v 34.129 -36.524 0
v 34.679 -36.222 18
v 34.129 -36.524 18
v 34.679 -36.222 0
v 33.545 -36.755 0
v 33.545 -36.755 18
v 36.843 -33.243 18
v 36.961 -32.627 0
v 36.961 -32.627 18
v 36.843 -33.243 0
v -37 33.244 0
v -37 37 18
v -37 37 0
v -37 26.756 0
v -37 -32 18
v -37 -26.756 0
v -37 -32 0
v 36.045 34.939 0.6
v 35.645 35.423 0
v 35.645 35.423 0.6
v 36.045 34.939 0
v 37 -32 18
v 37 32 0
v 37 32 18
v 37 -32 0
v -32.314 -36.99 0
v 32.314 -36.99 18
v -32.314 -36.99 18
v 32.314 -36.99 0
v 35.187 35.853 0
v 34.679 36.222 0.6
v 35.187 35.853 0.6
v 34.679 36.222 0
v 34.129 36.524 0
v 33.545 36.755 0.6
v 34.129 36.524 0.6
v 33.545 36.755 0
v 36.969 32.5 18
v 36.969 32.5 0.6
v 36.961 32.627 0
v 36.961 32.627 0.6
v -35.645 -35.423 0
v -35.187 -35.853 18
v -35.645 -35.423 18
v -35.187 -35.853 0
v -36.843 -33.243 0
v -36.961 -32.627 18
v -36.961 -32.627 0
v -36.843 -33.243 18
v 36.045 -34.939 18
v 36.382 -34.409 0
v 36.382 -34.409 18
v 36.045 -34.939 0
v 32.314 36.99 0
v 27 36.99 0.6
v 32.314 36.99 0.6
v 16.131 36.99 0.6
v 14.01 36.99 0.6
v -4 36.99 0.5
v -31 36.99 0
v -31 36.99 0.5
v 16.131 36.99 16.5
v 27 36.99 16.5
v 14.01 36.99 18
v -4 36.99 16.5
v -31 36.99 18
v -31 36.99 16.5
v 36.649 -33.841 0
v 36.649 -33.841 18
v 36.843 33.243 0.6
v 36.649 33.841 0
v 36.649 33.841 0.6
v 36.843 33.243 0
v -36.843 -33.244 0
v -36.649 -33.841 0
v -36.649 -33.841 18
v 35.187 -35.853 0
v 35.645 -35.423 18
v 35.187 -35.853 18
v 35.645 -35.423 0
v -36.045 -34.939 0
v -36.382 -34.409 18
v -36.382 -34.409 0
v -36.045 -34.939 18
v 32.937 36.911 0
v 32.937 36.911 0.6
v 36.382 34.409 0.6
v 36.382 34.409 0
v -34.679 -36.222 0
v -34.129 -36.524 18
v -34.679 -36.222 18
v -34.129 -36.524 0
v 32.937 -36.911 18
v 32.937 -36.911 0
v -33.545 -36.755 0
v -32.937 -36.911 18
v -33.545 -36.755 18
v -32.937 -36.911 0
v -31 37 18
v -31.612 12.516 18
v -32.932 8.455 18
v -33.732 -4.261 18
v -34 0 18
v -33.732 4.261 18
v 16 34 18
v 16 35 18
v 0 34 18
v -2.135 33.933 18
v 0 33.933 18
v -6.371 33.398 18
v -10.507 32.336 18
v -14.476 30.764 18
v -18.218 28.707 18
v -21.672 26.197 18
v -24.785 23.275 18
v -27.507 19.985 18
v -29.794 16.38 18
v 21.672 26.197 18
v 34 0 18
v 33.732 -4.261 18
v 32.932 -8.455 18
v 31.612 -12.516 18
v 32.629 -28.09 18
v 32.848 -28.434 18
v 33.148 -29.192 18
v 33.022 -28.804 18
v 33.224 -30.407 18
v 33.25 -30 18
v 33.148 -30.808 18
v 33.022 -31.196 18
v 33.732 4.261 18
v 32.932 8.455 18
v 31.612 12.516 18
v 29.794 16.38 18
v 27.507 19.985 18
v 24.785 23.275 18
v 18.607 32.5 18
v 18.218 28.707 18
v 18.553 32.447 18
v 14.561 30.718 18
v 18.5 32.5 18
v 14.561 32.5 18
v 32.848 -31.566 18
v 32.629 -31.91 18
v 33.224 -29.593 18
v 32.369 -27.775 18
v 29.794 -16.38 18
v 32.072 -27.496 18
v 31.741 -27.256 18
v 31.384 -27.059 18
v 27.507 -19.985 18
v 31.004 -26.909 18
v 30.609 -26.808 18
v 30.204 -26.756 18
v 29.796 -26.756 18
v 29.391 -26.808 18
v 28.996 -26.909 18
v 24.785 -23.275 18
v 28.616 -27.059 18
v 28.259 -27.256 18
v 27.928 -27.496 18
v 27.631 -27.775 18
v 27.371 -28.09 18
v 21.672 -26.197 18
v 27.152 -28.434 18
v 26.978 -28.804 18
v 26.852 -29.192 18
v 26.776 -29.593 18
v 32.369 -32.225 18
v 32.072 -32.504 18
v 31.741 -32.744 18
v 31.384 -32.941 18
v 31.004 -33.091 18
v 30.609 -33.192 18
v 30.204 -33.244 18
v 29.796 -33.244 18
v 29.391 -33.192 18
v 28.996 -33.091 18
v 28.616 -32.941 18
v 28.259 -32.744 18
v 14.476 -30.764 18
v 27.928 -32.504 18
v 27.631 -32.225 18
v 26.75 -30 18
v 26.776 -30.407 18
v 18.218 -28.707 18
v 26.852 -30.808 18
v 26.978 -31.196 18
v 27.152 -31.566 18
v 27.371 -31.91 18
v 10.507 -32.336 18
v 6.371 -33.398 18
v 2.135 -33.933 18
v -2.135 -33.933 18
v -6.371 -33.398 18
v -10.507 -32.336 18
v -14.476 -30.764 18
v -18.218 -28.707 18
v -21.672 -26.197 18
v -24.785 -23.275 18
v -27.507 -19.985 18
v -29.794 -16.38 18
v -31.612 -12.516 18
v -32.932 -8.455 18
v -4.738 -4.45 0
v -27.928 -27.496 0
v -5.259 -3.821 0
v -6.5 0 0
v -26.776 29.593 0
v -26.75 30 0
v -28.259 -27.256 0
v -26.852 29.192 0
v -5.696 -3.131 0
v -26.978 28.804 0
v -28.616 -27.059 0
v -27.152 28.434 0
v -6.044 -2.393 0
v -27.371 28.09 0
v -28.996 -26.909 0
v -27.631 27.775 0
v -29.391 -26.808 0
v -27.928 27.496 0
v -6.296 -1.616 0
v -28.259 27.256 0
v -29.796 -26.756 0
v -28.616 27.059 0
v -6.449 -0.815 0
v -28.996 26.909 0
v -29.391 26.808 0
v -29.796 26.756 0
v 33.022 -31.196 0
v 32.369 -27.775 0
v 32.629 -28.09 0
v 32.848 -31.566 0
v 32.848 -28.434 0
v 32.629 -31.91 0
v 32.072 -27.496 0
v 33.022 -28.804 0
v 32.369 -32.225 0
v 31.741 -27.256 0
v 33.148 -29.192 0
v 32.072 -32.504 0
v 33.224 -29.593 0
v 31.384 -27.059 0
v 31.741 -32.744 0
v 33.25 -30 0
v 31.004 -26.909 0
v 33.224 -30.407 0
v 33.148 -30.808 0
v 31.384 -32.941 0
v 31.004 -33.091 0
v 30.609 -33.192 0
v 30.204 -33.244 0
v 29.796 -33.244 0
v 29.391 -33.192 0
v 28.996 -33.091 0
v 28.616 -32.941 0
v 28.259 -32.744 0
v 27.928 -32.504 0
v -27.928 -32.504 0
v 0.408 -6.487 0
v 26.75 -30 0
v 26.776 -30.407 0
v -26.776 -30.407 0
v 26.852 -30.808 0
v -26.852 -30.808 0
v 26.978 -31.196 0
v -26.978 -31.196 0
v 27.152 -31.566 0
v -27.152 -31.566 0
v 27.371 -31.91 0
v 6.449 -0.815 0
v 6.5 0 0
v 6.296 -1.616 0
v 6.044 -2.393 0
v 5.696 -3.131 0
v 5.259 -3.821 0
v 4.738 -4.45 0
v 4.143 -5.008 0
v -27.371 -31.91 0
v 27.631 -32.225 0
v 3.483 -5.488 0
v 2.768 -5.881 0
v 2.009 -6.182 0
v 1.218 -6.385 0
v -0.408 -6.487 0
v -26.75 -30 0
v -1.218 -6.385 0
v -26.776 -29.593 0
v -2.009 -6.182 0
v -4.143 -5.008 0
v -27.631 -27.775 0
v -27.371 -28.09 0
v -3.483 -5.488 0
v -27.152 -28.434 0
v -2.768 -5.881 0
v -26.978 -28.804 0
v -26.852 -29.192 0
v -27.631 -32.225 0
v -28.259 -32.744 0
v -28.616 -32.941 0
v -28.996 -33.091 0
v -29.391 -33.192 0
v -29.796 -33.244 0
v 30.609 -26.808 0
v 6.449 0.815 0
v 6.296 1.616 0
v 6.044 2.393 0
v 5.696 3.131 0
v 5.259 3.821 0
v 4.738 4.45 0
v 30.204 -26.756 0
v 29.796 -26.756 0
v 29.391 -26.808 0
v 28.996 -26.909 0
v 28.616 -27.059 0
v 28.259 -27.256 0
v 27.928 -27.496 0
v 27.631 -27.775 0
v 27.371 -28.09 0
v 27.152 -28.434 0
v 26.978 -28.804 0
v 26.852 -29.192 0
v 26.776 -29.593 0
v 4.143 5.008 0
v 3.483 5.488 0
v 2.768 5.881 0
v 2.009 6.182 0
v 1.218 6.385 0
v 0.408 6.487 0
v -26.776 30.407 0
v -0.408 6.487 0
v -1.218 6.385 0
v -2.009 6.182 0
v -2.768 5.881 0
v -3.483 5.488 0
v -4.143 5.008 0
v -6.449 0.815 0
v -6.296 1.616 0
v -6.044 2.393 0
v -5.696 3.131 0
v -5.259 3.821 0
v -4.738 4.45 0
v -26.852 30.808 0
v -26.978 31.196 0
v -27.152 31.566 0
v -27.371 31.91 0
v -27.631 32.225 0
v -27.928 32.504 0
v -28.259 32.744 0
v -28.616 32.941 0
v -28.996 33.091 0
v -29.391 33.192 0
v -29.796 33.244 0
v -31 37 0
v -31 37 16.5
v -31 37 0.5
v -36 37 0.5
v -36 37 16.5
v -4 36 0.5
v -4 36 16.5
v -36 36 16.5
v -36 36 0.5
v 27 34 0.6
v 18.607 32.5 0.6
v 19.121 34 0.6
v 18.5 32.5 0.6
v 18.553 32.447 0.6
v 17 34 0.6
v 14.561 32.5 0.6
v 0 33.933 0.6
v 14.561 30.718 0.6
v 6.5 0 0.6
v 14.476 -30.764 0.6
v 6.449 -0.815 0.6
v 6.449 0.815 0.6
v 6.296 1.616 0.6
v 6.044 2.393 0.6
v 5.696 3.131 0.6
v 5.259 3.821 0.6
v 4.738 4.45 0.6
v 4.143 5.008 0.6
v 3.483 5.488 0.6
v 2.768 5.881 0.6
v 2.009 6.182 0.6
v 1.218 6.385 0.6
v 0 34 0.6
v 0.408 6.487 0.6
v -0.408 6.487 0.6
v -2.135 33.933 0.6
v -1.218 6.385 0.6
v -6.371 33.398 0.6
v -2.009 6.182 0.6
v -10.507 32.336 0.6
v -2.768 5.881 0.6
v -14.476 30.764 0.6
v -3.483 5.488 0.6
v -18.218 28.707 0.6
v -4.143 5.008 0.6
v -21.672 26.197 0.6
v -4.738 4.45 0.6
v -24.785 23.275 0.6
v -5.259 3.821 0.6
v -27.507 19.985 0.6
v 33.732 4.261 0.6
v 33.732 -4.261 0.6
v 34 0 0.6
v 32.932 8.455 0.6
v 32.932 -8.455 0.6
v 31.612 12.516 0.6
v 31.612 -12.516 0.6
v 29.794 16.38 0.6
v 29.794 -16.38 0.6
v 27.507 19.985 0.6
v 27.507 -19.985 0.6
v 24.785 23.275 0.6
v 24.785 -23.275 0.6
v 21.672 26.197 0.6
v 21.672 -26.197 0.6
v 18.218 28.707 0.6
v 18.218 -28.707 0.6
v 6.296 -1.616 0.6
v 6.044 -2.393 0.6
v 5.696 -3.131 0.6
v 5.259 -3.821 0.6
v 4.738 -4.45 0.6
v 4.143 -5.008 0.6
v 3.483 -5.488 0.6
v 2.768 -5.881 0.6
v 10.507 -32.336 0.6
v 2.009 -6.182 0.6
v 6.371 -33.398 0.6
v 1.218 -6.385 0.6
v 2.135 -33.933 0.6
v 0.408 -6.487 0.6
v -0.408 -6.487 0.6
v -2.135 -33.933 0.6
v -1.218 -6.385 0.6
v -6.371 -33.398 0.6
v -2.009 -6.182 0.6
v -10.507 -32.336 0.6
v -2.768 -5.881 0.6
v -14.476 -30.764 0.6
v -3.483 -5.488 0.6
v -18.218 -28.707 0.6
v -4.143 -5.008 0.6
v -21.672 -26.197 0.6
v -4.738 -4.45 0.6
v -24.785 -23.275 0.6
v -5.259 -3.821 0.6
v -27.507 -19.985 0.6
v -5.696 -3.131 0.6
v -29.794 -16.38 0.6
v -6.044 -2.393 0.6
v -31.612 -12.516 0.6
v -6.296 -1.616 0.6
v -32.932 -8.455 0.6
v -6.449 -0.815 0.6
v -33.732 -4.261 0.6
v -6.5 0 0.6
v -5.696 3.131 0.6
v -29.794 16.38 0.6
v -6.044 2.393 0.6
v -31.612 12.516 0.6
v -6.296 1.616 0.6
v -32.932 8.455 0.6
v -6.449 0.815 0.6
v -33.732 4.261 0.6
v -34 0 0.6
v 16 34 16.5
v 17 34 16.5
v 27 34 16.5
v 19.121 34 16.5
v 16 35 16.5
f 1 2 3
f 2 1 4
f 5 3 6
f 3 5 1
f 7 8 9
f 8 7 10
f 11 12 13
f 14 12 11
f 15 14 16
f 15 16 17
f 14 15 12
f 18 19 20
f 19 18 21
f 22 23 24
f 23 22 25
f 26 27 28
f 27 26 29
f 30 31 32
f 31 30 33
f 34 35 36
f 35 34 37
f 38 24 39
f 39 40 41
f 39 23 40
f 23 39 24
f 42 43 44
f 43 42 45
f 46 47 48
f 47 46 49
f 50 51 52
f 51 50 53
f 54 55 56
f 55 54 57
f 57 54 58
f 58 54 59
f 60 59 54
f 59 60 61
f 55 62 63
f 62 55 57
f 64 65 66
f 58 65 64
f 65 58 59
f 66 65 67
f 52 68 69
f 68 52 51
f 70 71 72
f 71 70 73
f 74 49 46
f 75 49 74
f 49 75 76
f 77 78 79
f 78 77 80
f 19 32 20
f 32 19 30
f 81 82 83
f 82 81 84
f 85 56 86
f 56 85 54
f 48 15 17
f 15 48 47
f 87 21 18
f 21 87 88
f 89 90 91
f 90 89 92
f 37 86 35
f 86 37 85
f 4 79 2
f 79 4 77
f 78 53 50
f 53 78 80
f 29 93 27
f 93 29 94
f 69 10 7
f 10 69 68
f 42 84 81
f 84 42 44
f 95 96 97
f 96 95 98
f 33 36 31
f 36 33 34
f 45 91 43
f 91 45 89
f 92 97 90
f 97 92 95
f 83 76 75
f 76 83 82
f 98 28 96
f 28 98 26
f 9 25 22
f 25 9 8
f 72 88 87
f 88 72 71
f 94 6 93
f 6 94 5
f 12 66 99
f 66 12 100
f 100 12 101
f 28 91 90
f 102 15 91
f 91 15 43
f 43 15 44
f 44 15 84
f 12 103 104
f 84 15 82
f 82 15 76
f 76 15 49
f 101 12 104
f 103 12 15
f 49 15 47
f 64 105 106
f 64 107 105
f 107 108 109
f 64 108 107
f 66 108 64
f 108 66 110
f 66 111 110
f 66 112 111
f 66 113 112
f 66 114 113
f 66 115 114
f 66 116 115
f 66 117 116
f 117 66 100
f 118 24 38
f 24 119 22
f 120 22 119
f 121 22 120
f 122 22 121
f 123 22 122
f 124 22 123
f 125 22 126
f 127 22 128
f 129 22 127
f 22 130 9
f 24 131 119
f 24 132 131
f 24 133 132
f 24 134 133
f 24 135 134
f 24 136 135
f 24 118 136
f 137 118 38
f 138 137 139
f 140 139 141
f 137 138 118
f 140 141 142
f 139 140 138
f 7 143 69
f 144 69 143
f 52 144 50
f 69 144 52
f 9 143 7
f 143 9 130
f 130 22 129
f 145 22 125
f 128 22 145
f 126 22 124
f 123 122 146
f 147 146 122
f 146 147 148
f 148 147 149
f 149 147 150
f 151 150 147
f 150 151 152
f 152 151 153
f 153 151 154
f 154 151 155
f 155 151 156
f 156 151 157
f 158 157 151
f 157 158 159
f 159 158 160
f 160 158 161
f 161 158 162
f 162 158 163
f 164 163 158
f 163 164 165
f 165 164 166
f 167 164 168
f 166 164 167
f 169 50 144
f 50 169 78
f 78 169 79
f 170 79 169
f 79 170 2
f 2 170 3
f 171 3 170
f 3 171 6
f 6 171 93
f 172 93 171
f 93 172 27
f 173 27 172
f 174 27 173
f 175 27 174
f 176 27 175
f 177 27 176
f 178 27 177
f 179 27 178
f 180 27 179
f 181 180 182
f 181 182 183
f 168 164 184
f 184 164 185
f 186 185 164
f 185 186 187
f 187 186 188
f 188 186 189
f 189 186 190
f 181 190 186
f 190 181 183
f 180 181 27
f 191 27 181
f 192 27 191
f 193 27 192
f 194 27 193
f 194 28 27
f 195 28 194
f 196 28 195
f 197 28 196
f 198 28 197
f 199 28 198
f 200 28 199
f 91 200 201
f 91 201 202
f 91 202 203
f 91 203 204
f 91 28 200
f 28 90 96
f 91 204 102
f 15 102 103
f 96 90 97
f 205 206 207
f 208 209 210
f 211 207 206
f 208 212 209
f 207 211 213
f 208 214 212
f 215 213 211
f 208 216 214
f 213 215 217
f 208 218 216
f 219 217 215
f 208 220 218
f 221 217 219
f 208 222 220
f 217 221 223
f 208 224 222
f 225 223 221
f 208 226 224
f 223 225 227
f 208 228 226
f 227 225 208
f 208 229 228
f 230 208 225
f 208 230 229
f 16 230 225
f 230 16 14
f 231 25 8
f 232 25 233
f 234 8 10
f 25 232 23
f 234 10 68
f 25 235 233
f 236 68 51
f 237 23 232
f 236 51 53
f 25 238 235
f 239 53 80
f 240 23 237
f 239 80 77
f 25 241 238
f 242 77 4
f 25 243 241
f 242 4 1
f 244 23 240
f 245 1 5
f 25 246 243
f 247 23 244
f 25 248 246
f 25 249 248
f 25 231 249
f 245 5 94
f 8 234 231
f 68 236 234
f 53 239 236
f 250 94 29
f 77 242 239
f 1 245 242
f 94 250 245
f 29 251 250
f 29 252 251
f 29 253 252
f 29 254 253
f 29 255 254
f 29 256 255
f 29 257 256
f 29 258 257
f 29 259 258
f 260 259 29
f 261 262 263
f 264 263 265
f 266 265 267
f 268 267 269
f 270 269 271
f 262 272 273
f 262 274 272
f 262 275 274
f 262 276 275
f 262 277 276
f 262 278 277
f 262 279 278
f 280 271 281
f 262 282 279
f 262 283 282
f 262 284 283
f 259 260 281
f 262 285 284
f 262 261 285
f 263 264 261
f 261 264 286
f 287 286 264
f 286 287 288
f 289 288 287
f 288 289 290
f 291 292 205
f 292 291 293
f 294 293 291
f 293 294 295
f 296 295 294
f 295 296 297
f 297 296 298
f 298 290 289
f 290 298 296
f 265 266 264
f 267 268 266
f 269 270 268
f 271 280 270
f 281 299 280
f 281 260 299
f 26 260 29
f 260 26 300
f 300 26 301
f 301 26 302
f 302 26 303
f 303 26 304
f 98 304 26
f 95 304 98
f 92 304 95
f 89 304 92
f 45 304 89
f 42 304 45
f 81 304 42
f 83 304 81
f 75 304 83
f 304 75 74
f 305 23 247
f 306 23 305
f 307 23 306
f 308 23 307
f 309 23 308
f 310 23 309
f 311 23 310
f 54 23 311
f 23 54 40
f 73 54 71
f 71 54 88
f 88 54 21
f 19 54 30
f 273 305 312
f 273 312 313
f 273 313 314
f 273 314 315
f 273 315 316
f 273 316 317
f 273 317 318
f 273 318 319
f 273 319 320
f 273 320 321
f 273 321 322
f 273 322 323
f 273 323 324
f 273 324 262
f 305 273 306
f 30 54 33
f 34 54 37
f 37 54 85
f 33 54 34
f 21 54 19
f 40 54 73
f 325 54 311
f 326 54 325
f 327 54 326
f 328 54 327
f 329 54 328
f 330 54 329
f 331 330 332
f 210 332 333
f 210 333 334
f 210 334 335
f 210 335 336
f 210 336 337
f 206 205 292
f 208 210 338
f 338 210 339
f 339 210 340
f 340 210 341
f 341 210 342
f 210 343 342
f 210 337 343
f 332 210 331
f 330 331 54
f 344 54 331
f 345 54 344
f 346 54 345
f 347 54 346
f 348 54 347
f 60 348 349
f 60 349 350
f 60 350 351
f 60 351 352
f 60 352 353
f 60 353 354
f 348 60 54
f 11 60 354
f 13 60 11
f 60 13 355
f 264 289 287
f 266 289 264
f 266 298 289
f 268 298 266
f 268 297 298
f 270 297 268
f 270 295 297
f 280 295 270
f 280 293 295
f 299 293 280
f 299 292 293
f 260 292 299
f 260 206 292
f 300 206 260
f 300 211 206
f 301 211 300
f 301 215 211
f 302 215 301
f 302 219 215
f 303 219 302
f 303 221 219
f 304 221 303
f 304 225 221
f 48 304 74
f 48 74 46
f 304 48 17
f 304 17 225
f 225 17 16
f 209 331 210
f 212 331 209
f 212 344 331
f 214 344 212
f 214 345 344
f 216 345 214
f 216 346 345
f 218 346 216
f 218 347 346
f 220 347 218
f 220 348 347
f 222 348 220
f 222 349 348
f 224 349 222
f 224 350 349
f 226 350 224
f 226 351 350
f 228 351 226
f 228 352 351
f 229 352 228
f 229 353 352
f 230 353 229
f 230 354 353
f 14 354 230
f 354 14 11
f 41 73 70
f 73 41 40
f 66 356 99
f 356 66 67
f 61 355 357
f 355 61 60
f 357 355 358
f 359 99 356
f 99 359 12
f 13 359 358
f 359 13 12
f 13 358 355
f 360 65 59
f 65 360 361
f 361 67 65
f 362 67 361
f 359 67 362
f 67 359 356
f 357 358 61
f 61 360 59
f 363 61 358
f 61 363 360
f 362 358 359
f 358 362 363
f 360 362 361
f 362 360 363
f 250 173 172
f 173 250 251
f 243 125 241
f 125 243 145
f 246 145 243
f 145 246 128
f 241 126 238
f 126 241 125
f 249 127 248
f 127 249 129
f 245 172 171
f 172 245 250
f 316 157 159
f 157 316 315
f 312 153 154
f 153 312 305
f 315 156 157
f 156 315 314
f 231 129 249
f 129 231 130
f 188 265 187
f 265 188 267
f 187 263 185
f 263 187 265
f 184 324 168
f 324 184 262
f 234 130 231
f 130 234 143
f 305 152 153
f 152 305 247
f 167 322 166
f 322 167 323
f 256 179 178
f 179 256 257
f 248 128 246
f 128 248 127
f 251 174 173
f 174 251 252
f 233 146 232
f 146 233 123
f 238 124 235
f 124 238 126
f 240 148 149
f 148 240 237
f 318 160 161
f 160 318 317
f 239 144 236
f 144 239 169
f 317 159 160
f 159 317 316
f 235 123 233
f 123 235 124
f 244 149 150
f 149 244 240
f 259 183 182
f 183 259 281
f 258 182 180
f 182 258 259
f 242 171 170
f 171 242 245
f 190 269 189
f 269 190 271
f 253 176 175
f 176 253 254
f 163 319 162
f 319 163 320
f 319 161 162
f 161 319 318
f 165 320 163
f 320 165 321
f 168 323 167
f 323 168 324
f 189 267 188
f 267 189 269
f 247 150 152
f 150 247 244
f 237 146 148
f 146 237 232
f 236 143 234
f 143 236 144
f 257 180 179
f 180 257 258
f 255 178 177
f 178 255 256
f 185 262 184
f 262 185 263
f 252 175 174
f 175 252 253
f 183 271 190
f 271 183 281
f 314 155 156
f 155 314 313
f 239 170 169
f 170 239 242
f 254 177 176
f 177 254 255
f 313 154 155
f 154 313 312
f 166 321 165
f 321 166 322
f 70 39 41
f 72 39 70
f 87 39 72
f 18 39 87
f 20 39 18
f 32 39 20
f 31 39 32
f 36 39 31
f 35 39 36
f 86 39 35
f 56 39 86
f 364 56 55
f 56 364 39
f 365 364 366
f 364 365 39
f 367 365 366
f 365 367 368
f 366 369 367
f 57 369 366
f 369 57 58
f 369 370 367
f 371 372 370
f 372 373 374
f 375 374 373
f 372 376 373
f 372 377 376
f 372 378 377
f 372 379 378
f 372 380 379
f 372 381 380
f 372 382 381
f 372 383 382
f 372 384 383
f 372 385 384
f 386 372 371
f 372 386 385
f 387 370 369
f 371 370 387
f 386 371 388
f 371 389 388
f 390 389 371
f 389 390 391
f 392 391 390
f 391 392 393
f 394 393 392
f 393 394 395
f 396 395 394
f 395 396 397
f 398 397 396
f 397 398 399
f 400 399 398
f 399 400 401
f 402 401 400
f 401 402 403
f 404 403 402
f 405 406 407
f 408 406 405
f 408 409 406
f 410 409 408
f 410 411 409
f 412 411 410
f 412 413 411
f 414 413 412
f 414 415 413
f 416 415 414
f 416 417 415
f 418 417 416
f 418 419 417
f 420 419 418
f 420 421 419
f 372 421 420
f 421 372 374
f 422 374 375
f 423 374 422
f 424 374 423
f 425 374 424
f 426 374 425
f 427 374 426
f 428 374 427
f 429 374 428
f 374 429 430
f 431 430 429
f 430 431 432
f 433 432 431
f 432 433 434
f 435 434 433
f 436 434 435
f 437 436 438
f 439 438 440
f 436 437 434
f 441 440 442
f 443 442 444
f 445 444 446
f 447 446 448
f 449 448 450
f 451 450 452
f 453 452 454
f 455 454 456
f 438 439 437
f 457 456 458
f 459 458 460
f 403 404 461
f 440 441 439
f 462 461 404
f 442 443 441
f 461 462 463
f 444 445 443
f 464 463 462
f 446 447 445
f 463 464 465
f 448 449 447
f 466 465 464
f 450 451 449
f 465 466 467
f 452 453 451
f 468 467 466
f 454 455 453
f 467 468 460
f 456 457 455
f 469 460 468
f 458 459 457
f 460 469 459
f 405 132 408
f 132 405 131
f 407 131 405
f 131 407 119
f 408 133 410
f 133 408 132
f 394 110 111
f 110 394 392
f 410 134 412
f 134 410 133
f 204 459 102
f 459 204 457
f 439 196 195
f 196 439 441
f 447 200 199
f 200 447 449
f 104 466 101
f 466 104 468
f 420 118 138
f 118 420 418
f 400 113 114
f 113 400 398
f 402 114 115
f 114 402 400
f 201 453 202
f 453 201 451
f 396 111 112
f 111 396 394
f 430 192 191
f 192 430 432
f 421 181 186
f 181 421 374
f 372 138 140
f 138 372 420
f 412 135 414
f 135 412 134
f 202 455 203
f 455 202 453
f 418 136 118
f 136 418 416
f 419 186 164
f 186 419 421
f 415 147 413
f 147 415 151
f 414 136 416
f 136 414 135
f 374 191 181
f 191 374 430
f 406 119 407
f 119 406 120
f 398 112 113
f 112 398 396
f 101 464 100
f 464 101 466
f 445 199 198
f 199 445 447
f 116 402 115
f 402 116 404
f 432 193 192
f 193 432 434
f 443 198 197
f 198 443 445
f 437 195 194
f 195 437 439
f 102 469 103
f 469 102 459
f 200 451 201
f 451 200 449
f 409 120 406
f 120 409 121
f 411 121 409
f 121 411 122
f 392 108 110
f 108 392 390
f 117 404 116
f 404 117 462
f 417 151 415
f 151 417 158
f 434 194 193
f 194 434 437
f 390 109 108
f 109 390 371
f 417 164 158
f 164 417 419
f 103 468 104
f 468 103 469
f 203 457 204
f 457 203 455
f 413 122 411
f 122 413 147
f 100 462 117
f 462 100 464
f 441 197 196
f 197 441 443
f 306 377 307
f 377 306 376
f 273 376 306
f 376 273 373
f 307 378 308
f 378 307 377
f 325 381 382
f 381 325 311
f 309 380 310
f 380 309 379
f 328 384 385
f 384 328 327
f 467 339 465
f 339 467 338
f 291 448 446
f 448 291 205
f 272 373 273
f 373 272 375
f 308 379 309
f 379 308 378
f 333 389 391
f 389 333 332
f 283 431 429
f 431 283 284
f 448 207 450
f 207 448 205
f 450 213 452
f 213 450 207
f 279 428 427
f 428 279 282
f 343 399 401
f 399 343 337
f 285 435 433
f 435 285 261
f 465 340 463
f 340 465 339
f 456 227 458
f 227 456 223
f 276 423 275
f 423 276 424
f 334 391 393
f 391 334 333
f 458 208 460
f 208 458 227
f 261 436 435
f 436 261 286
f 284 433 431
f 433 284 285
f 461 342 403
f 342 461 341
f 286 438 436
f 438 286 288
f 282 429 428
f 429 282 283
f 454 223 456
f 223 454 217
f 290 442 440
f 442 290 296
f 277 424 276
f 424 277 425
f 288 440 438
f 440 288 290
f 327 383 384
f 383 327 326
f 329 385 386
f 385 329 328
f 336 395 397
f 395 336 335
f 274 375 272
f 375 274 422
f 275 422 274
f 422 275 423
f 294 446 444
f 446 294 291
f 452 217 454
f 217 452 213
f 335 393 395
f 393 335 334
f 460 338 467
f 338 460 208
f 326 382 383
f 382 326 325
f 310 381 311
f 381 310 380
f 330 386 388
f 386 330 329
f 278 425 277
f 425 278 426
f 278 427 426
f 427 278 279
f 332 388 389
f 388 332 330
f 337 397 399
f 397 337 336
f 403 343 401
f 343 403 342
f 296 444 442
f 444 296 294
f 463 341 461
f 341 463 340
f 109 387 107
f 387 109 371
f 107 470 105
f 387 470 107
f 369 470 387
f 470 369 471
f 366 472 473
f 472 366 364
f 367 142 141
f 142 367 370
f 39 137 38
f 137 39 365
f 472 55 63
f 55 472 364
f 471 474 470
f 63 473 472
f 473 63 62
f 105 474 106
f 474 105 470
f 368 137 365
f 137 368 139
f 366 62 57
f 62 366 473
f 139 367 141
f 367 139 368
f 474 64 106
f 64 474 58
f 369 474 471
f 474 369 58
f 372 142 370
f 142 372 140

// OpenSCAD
$fn = 50;


difference() {
	union() {
		hull() {
			translate(v = [-32.0000000000, 32.0000000000, 0]) {
				cylinder(h = 18, r = 5);
			}
			translate(v = [32.0000000000, 32.0000000000, 0]) {
				cylinder(h = 18, r = 5);
			}
			translate(v = [-32.0000000000, -32.0000000000, 0]) {
				cylinder(h = 18, r = 5);
			}
			translate(v = [32.0000000000, -32.0000000000, 0]) {
				cylinder(h = 18, r = 5);
			}
		}
		translate(v = [-37.0000000000, 31.0000000000, 0]) {
			cube(size = [6, 6, 18]);
		}
	}
	union() {
		translate(v = [-37.5000000000, -30.0000000000, -250.0000000000]) {
			rotate(a = [0, 0, 0]) {
				difference() {
					union() {
						hull() {
							translate(v = [7.5000000000, 0, 0]) {
								cylinder(h = 250, r = 3.2500000000, r1 = 3.2500000000, r2 = 3.2500000000);
							}
							translate(v = [-7.5000000000, 0, 0]) {
								cylinder(h = 250, r = 3.2500000000, r1 = 3.2500000000, r2 = 3.2500000000);
							}
						}
					}
					union();
				}
			}
		}
		translate(v = [-37.5000000000, 30.0000000000, -250.0000000000]) {
			rotate(a = [0, 0, 0]) {
				difference() {
					union() {
						hull() {
							translate(v = [7.5000000000, 0, 0]) {
								cylinder(h = 250, r = 3.2500000000, r1 = 3.2500000000, r2 = 3.2500000000);
							}
							translate(v = [-7.5000000000, 0, 0]) {
								cylinder(h = 250, r = 3.2500000000, r1 = 3.2500000000, r2 = 3.2500000000);
							}
						}
					}
					union();
				}
			}
		}
		translate(v = [-36.0000000000, 36.0000000000, 0.5000000000]) {
			cube(size = [32, 1, 16]);
		}
		translate(v = [30.0000000000, -30.0000000000, -50.0000000000]) {
			cylinder(h = 100, r = 3.2500000000);
		}
		translate(v = [0, 0, 0.6000000000]) {
			cylinder(h = 20.4000000000, r = 34.0000000000);
		}
		translate(v = [0, 0, -9.0000000000]) {
			cylinder(h = 18, r = 6.5000000000);
		}
		translate(v = [0.0000000000, 32.5000000000, 0.6000000000]) {
			cube(size = [37.0000000000, 1.5000000000, 20.4000000000]);
		}
		translate(v = [27.0000000000, 32.5000000000, 0.6000000000]) {
			cube(size = [10, 4.5000000000, 20.4000000000]);
		}
		translate(v = [16.0000000000, 32.5000000000, 16.5000000000]) {
			cube(size = [21, 4.5000000000, 1.5000000000]);
		}
		translate(v = [13.2500000000, 37.7500000000, 0.6000000000]) {
			rotate(a = [0, 0, -45]) {
				cube(size = [7.5000000000, 1.5000000000, 20.4000000000]);
			}
		}
		translate(v = [7.0610000000, 30.5000000000, 0.6000000000]) {
			cube(size = [7.5000000000, 2, 17.4000000000]);
		}
	}
}
